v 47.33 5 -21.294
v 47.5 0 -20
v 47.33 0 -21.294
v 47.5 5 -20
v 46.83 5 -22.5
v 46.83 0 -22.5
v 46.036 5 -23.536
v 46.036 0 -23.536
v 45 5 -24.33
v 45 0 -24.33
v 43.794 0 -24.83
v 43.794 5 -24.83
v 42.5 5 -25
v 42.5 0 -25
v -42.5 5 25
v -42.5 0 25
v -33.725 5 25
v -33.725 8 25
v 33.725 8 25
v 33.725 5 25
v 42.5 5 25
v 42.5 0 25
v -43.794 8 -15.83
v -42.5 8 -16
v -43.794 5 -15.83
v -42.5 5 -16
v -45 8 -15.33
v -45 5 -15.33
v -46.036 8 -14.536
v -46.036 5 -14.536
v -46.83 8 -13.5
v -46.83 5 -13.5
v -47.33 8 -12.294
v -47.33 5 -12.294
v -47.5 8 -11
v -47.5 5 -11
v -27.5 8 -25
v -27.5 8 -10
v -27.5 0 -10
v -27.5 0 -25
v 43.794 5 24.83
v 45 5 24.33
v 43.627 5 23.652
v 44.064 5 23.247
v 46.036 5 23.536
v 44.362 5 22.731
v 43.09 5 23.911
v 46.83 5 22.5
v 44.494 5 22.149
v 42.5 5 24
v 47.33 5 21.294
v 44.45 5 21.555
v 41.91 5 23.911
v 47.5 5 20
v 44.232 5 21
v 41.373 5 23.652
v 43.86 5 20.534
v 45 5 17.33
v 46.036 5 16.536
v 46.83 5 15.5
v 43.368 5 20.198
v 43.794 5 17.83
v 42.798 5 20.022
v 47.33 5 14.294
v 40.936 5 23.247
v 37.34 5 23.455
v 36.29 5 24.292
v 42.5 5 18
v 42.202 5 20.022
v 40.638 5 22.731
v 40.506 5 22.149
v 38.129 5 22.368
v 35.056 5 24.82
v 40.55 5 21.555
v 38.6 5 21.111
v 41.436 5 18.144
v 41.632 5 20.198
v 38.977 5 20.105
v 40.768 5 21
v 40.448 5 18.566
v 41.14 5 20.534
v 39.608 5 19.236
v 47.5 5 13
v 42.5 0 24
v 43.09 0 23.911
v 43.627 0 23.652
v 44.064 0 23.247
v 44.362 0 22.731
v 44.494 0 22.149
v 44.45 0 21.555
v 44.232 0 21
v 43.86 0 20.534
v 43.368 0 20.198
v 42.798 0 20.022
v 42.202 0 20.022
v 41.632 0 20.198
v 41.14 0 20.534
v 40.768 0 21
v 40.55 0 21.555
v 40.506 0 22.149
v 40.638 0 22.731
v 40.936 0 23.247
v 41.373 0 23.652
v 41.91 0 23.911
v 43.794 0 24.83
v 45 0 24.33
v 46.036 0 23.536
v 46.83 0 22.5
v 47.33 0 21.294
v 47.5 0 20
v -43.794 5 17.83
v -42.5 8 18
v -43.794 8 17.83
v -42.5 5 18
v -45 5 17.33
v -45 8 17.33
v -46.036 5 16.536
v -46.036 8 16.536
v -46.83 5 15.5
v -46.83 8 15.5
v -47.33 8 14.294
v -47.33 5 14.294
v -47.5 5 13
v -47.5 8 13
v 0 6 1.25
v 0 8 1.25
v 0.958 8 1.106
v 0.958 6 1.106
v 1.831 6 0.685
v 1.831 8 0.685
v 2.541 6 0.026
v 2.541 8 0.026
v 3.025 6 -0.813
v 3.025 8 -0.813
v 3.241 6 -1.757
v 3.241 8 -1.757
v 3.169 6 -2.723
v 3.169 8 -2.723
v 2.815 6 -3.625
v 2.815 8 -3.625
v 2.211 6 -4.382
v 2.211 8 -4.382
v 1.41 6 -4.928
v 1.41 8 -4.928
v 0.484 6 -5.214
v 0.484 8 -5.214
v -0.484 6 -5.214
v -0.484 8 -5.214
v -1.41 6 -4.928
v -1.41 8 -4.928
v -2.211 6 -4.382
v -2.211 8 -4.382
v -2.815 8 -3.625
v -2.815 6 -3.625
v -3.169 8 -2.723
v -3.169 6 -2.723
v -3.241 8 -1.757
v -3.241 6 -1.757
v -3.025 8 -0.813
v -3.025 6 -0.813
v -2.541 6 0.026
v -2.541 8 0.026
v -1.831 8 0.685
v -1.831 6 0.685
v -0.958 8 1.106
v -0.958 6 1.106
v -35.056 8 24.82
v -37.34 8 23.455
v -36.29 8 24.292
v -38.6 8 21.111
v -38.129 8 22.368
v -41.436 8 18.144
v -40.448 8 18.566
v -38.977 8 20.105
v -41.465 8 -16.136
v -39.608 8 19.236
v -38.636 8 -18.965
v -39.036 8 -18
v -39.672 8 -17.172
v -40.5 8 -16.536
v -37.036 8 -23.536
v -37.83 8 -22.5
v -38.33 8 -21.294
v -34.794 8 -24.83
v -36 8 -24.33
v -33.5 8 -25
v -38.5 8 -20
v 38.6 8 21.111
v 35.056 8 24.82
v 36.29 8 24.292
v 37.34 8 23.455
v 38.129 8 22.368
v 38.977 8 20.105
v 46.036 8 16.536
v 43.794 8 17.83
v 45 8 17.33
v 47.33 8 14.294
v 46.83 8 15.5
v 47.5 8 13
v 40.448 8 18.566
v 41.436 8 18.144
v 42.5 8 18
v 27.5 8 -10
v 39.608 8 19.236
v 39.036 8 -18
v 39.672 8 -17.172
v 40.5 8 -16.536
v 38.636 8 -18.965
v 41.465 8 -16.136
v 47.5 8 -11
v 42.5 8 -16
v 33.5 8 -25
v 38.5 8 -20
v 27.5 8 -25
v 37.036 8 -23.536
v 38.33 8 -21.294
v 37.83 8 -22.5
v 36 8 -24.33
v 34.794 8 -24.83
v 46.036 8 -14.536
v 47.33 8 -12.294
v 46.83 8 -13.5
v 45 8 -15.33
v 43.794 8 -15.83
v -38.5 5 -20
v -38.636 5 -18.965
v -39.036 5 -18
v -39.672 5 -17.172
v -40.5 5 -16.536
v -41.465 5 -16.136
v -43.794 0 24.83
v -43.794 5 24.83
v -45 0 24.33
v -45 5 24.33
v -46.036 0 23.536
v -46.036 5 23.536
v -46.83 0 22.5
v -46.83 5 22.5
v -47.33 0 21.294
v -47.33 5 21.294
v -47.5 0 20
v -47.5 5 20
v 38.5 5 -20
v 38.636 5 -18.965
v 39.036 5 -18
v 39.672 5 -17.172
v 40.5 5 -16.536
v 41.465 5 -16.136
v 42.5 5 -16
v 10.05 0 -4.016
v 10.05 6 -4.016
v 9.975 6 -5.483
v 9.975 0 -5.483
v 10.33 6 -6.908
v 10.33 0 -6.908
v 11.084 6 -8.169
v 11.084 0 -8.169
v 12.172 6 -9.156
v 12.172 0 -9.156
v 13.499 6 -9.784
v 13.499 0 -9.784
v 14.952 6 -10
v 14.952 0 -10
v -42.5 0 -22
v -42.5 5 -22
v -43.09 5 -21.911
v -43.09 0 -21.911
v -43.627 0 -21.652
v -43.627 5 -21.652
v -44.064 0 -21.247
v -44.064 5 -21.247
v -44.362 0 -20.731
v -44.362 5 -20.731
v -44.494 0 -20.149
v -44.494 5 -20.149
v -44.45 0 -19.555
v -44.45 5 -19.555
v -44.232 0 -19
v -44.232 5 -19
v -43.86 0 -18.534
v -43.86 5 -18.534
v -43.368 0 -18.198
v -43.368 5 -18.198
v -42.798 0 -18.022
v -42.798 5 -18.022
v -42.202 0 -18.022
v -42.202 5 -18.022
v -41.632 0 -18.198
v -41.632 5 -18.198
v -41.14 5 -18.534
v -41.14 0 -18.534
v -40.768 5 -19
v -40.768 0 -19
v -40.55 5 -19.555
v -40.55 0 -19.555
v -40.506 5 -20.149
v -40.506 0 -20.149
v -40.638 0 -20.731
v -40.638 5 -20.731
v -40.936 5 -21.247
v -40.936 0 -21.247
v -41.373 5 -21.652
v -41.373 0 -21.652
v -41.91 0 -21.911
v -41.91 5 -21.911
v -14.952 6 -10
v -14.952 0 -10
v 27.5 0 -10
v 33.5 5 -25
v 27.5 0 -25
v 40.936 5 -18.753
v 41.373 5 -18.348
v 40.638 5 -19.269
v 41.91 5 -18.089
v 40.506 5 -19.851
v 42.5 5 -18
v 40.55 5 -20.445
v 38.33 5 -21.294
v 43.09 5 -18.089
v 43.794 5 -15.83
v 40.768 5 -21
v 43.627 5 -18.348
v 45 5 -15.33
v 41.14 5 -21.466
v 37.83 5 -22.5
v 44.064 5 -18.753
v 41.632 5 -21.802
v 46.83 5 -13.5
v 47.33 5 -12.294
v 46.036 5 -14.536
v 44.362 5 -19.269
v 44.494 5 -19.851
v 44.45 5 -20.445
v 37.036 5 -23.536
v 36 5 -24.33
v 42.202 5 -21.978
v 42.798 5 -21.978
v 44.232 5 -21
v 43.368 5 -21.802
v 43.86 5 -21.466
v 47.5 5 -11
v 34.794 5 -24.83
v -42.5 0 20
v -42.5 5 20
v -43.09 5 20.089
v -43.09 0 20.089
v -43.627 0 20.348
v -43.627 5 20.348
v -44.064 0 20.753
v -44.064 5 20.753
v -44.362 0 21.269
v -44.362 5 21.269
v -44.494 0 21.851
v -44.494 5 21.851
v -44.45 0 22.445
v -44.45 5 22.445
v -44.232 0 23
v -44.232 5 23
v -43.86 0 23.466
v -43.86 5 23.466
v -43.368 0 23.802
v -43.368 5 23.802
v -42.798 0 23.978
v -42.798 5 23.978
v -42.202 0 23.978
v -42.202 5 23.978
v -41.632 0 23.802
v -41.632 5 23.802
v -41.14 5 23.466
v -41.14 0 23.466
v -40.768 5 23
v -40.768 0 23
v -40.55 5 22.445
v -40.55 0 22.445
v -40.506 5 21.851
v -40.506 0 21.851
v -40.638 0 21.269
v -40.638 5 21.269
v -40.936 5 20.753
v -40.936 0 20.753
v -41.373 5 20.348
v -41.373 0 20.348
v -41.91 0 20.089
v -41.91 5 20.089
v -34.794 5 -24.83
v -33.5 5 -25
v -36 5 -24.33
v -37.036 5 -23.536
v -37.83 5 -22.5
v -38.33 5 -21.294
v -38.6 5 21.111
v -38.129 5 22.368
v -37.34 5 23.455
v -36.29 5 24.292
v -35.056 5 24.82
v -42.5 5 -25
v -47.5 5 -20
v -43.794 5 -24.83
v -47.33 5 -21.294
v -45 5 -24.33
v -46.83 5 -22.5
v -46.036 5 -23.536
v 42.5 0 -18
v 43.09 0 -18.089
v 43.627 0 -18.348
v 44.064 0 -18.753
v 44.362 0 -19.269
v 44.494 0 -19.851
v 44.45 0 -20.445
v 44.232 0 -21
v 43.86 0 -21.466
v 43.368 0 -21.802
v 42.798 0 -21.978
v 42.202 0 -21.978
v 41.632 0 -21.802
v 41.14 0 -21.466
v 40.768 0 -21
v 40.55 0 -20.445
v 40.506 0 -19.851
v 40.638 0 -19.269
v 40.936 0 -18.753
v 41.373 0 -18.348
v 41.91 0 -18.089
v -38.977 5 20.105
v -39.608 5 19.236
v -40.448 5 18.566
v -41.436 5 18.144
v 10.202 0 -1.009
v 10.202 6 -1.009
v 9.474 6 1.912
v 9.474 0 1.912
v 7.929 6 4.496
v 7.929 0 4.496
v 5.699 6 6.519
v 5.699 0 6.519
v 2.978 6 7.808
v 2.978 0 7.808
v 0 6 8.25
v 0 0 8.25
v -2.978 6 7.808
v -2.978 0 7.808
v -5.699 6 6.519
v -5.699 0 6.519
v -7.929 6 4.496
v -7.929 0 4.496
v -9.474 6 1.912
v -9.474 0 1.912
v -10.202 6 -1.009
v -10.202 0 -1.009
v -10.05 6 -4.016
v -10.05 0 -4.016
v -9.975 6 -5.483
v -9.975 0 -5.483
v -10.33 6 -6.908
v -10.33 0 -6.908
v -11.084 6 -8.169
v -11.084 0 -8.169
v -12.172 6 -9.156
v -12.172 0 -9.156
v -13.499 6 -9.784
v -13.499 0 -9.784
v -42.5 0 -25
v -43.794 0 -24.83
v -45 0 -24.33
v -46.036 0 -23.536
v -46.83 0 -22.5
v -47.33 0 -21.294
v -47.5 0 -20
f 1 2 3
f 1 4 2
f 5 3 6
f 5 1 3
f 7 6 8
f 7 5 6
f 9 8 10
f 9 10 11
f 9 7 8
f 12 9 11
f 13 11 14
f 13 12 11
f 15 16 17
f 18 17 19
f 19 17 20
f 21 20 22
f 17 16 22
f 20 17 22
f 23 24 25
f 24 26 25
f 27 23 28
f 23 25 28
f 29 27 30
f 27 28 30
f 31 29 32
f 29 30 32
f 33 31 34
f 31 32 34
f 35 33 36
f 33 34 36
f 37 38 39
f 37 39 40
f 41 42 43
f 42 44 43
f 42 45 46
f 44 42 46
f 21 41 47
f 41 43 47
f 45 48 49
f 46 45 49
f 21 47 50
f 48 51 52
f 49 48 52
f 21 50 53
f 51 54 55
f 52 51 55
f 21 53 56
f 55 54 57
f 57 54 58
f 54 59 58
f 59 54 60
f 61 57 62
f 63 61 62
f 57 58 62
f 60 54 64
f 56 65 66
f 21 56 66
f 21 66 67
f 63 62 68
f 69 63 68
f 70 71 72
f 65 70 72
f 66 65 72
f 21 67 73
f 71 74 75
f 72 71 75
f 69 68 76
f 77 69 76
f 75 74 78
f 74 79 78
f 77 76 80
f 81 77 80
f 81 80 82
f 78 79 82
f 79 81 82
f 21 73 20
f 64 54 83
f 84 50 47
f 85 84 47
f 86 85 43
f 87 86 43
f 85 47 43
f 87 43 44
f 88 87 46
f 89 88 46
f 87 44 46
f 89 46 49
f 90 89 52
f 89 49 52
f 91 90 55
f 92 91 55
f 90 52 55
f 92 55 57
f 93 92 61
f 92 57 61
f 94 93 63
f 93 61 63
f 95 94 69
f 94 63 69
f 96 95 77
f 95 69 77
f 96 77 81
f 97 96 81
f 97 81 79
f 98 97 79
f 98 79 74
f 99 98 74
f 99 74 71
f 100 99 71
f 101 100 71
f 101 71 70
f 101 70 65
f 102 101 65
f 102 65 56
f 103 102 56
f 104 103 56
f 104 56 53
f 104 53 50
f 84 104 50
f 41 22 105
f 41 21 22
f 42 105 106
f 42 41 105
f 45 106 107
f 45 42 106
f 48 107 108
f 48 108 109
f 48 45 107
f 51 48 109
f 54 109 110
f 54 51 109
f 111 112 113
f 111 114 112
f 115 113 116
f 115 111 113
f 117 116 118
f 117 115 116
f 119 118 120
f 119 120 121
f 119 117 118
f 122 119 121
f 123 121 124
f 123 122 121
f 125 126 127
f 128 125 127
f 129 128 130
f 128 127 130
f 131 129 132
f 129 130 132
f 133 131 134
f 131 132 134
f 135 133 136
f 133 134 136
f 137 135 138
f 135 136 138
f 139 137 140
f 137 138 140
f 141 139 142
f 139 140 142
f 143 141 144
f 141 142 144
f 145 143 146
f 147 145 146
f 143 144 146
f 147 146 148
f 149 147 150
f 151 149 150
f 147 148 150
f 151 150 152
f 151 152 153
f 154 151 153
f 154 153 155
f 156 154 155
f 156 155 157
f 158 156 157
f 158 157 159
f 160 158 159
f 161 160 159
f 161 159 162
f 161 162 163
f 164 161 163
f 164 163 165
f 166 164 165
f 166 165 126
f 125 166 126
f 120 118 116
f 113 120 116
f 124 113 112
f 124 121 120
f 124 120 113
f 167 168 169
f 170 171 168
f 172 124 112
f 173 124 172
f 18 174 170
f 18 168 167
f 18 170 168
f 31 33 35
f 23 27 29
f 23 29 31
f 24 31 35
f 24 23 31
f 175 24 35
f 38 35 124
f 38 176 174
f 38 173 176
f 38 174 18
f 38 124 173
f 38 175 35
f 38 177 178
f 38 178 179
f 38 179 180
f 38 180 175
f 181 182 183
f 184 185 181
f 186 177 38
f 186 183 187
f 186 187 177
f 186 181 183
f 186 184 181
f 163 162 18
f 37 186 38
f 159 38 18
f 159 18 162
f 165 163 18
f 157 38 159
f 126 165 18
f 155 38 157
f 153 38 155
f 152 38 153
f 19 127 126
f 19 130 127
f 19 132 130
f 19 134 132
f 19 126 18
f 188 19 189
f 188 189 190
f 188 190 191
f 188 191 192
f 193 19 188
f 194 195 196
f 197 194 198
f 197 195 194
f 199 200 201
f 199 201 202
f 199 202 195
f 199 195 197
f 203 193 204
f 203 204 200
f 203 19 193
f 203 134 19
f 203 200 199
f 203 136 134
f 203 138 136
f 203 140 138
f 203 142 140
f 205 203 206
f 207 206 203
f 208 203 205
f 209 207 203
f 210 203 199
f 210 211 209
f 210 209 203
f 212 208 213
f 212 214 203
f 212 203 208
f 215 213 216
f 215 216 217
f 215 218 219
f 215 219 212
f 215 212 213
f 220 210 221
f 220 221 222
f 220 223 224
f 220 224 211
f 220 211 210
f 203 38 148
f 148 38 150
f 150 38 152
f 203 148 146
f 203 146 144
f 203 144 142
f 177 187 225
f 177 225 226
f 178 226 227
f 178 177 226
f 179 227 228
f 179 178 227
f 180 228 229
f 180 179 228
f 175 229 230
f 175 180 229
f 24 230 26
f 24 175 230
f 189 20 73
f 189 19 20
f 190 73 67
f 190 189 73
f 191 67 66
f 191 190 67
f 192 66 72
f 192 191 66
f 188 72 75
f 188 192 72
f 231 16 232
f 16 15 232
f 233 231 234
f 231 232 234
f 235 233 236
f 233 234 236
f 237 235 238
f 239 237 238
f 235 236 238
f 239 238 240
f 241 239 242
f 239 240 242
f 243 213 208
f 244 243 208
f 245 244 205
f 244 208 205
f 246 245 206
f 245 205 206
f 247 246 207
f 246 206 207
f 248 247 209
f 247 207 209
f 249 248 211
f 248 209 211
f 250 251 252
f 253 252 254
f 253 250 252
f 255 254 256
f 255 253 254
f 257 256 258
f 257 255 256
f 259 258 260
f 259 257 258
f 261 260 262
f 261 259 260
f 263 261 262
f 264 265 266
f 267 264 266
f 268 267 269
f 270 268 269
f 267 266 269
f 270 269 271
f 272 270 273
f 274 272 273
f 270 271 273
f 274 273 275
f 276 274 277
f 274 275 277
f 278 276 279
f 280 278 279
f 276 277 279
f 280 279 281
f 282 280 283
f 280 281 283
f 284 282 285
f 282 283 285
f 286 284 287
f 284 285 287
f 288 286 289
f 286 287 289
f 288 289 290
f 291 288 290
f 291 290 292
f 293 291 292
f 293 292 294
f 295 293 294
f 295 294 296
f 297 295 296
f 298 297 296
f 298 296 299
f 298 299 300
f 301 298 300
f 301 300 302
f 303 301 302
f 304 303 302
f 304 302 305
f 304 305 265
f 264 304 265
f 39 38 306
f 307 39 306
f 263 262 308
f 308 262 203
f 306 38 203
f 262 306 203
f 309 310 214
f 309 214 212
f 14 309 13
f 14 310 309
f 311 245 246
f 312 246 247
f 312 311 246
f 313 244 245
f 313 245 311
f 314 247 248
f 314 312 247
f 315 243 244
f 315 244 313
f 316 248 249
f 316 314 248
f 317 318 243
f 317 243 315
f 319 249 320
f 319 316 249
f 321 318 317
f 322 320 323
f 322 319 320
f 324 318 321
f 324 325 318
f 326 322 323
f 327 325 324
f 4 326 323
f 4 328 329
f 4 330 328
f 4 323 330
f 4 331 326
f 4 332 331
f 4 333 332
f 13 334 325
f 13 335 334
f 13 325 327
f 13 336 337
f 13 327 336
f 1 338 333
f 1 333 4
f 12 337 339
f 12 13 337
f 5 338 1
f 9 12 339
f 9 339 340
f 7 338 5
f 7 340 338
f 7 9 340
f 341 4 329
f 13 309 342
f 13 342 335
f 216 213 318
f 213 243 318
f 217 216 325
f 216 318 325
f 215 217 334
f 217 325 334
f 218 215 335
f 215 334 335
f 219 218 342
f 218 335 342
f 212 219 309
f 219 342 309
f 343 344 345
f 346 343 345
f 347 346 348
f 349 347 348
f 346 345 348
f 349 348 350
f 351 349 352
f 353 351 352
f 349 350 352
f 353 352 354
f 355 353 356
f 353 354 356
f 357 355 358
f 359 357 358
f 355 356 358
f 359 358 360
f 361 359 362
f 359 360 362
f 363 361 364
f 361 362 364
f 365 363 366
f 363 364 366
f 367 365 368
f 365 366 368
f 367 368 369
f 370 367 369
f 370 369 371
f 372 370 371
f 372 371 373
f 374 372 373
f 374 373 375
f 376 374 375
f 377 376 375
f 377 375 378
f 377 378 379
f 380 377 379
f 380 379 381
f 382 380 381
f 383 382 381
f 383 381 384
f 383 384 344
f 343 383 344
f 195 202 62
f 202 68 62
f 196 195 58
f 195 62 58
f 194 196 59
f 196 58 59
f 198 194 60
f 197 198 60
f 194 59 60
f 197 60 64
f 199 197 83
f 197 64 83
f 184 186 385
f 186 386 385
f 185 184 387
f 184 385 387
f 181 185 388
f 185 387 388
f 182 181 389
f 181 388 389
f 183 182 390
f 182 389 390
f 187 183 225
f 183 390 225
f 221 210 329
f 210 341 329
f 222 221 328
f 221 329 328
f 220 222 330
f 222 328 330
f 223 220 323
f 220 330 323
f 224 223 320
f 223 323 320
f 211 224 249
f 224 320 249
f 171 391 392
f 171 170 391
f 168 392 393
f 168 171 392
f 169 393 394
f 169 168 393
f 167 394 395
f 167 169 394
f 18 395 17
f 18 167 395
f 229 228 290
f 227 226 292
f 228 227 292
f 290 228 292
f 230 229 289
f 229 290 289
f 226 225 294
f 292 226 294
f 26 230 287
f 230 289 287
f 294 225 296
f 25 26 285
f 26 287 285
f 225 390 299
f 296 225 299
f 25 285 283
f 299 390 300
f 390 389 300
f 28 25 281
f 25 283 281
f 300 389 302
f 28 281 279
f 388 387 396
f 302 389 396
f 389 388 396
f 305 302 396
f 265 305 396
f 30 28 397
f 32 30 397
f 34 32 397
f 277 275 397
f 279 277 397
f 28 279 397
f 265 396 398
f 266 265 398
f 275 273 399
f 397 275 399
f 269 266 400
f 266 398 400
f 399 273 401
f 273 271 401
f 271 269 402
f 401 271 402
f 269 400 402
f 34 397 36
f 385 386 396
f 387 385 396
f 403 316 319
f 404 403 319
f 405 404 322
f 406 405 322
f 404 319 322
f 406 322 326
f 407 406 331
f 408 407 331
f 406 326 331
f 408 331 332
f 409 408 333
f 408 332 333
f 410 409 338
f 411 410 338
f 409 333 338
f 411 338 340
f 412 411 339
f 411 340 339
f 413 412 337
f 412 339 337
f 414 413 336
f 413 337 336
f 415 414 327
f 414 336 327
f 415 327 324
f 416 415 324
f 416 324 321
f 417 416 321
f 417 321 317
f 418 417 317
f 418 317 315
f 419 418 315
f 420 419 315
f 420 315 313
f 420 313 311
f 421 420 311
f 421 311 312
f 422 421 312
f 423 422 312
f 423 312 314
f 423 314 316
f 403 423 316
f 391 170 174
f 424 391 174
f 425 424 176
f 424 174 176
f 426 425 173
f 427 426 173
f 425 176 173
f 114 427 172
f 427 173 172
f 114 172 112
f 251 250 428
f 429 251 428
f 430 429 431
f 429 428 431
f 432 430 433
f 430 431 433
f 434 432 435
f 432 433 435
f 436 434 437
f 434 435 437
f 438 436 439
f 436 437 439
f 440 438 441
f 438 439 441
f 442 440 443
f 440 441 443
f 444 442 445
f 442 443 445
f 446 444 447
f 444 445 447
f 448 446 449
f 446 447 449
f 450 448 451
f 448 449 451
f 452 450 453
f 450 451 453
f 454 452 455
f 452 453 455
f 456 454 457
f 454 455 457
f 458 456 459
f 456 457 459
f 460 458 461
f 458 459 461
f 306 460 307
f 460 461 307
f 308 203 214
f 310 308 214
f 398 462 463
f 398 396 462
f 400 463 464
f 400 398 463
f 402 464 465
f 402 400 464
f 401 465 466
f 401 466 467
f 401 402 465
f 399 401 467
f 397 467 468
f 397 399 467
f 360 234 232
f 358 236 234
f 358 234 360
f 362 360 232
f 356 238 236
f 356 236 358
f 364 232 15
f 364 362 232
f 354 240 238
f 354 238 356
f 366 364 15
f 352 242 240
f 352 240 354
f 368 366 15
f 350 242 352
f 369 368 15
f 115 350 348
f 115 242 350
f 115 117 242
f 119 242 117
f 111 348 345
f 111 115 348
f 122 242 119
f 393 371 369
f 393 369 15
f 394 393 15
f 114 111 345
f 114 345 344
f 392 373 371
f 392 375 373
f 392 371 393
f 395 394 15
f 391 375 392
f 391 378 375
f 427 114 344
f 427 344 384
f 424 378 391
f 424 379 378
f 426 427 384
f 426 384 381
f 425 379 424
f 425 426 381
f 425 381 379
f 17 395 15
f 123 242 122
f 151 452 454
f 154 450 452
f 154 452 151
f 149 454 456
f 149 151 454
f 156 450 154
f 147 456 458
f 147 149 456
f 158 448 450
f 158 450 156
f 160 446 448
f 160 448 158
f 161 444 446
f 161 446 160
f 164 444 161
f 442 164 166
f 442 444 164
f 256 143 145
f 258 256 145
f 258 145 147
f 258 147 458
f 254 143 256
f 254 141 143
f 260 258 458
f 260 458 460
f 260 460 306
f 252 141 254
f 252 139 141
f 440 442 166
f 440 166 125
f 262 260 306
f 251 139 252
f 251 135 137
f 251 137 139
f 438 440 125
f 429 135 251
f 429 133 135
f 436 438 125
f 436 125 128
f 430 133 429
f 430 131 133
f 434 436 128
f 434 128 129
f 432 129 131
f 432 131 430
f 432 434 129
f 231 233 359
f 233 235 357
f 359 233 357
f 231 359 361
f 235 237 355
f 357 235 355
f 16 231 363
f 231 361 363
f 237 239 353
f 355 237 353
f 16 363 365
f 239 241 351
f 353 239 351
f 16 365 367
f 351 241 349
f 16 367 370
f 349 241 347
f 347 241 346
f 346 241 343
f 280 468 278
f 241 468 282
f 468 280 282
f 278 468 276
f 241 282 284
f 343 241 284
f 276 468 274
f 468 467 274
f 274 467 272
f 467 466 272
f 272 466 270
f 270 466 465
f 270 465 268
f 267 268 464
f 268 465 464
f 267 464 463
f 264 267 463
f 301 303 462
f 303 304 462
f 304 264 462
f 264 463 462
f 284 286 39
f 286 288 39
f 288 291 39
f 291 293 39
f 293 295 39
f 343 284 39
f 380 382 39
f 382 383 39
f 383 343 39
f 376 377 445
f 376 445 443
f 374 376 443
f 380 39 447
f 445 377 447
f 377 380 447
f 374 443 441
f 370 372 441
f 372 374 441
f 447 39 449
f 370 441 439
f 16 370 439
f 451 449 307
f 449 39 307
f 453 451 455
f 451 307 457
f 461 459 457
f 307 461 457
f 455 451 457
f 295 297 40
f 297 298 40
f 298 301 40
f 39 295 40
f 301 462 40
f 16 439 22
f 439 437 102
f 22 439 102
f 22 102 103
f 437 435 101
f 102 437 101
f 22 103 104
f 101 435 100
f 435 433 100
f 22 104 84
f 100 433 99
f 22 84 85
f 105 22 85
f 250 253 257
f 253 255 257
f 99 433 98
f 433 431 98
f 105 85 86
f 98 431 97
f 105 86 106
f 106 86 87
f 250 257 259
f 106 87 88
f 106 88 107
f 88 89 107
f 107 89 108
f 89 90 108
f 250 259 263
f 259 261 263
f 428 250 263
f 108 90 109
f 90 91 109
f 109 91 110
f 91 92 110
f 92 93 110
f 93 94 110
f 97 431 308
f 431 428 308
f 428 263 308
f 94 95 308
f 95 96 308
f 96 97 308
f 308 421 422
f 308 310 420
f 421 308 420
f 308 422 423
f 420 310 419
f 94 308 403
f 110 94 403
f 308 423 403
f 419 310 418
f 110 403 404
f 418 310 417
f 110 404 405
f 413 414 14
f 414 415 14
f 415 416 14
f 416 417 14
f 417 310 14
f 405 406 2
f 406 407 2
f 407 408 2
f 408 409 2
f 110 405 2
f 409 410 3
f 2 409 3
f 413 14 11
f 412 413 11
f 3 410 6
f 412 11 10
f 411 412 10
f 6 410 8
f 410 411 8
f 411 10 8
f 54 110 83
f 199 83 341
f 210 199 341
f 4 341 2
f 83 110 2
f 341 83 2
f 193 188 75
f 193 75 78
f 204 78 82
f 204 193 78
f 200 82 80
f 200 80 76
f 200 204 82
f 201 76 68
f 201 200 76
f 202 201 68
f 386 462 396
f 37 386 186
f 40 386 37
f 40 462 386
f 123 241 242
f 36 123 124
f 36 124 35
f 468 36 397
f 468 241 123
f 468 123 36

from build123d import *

# Parameters (mm, degrees)
SKETCH1_W           = 95
SKETCH1_H           = 50
BOSS_EXTRUDE1_DEPTH = 8
SKETCH2_W           = 55
SKETCH2_H           = 15
CUT_EXTRUDE1_DEPTH  = 55.270157545
SKETCH3_R           = 3.25
CUT_EXTRUDE2_DEPTH  = 55.270157545
SKETCH4_R           = 10.25
CUT_EXTRUDE3_DEPTH  = 6
FILLET1_R           = 5
SKETCH5_R           = 2
CUT_EXTRUDE4_DEPTH  = 55.270157545
CUT_EXTRUDE5_DEPTH  = 3
FILLET2_R           = 5


with BuildPart() as part:
    # Sketch1 → Boss-Extrude1 (new body)
    with BuildSketch(Plane(origin=(0, 0, 0), x_dir=(1, 0, 0), z_dir=(0, 1, 0))):
        Rectangle(SKETCH1_W, SKETCH1_H)
    extrude(amount=BOSS_EXTRUDE1_DEPTH)

    # Sketch2 → Cut-Extrude1 (cut, through all)
    with BuildSketch(Plane(origin=(0, 8, 0), x_dir=(1, 0, 0), z_dir=(0, 1, 0))):
        with Locations((0, 17.5)):
            Rectangle(SKETCH2_W, SKETCH2_H)
    extrude(amount=-CUT_EXTRUDE1_DEPTH, mode=Mode.SUBTRACT)

    # Sketch3 → Cut-Extrude2 (cut, through all)
    with BuildSketch(Plane(origin=(0, 8, 0), x_dir=(1, 0, 0), z_dir=(0, 1, 0))):
        with Locations(Location((0, 2, 0), (0, 0, 270))):
            Circle(SKETCH3_R)
    extrude(amount=-CUT_EXTRUDE2_DEPTH, mode=Mode.SUBTRACT)

    # Sketch4 → Cut-Extrude3 (cut)
    with BuildSketch(Plane.XZ):
        with Locations((0, -2)):
            Circle(SKETCH4_R)
    extrude(amount=-CUT_EXTRUDE3_DEPTH, mode=Mode.SUBTRACT)

    # Fillet1
    fillet1_edges = [part.edges().sort_by_distance(p)[0] for p in [
        (6.408002809, 3, -10),
        (-6.408002809, 3, -10),
    ]]
    fillet(fillet1_edges, radius=FILLET1_R)

    # Sketch5 → Cut-Extrude4 (cut, through all)
    with BuildSketch(Plane(origin=(0, 8, 0), x_dir=(1, 0, 0), z_dir=(0, 1, 0))):
        with Locations(Location((42.5, 20, 0), (0, 0, 270))):
            Circle(SKETCH5_R)
        with Locations(Location((42.5, -22, 0), (0, 0, 270))):
            Circle(SKETCH5_R)
        with Locations(Location((-42.5, -22, 0), (0, 0, 90))):
            Circle(SKETCH5_R)
        with Locations(Location((-42.5, 20, 0), (0, 0, 90))):
            Circle(SKETCH5_R)
    extrude(amount=-CUT_EXTRUDE4_DEPTH, mode=Mode.SUBTRACT)

    # Sketch6 → Cut-Extrude5 (cut)
    with BuildSketch(Plane(origin=(0, 8, 0), x_dir=(1, 0, 0), z_dir=(0, 1, 0))):
        with BuildLine():
            Line((-42.5, -18), (-47.5, -18))
            Line((-47.5, -18), (-47.5, -25))
            Line((-47.5, -25), (-45.145751311, -25))
            ThreePointArc((-45.145751311, -25), (-38.758342613, -23.414213562), (-42.5, -18))
        make_face()
        with BuildLine():
            Line((47.5, -25), (45.145751311, -25))
            ThreePointArc((45.145751311, -25), (38.758342613, -23.414213562), (42.5, -18))
            Line((42.5, -18), (47.5, -18))
            Line((47.5, -18), (47.5, -25))
        make_face()
        with BuildLine():
            Line((-42.5, 16), (-47.5, 16))
            Line((-47.5, 16), (-47.5, 25))
            Line((-47.5, 25), (-38.5, 25))
            Line((-38.5, 25), (-38.5, 20))
            ThreePointArc((-38.5, 20), (-39.671572875, 17.171572875), (-42.5, 16))
        make_face()
        with BuildLine():
            Line((42.5, 16), (47.5, 16))
            Line((47.5, 16), (47.5, 25))
            Line((47.5, 25), (38.5, 25))
            Line((38.5, 25), (38.5, 20))
            ThreePointArc((38.5, 20), (39.671572875, 17.171572875), (42.5, 16))
        make_face()
    extrude(amount=-CUT_EXTRUDE5_DEPTH, mode=Mode.SUBTRACT)

    # Fillet2
    fillet2_edges = [part.edges().sort_by_distance(p)[0] for p in [
        (-47.5, 6.5, 18),
        (-39.854248689, 6.5, 25),
        (47.5, 6.5, 18),
        (39.854248689, 6.5, 25),
        (-47.5, 2.5, 25),
        (47.5, 2.5, 25),
        (47.5, 2.5, -25),
        (47.5, 6.5, -16),
        (38.5, 6.5, -25),
        (-47.5, 2.5, -25),
        (-38.5, 6.5, -25),
        (-47.5, 6.5, -16),
    ]]
    fillet(fillet2_edges, radius=FILLET2_R - 0.0001)  # a hair under: the kernel refuses the full size


solid = part.part
